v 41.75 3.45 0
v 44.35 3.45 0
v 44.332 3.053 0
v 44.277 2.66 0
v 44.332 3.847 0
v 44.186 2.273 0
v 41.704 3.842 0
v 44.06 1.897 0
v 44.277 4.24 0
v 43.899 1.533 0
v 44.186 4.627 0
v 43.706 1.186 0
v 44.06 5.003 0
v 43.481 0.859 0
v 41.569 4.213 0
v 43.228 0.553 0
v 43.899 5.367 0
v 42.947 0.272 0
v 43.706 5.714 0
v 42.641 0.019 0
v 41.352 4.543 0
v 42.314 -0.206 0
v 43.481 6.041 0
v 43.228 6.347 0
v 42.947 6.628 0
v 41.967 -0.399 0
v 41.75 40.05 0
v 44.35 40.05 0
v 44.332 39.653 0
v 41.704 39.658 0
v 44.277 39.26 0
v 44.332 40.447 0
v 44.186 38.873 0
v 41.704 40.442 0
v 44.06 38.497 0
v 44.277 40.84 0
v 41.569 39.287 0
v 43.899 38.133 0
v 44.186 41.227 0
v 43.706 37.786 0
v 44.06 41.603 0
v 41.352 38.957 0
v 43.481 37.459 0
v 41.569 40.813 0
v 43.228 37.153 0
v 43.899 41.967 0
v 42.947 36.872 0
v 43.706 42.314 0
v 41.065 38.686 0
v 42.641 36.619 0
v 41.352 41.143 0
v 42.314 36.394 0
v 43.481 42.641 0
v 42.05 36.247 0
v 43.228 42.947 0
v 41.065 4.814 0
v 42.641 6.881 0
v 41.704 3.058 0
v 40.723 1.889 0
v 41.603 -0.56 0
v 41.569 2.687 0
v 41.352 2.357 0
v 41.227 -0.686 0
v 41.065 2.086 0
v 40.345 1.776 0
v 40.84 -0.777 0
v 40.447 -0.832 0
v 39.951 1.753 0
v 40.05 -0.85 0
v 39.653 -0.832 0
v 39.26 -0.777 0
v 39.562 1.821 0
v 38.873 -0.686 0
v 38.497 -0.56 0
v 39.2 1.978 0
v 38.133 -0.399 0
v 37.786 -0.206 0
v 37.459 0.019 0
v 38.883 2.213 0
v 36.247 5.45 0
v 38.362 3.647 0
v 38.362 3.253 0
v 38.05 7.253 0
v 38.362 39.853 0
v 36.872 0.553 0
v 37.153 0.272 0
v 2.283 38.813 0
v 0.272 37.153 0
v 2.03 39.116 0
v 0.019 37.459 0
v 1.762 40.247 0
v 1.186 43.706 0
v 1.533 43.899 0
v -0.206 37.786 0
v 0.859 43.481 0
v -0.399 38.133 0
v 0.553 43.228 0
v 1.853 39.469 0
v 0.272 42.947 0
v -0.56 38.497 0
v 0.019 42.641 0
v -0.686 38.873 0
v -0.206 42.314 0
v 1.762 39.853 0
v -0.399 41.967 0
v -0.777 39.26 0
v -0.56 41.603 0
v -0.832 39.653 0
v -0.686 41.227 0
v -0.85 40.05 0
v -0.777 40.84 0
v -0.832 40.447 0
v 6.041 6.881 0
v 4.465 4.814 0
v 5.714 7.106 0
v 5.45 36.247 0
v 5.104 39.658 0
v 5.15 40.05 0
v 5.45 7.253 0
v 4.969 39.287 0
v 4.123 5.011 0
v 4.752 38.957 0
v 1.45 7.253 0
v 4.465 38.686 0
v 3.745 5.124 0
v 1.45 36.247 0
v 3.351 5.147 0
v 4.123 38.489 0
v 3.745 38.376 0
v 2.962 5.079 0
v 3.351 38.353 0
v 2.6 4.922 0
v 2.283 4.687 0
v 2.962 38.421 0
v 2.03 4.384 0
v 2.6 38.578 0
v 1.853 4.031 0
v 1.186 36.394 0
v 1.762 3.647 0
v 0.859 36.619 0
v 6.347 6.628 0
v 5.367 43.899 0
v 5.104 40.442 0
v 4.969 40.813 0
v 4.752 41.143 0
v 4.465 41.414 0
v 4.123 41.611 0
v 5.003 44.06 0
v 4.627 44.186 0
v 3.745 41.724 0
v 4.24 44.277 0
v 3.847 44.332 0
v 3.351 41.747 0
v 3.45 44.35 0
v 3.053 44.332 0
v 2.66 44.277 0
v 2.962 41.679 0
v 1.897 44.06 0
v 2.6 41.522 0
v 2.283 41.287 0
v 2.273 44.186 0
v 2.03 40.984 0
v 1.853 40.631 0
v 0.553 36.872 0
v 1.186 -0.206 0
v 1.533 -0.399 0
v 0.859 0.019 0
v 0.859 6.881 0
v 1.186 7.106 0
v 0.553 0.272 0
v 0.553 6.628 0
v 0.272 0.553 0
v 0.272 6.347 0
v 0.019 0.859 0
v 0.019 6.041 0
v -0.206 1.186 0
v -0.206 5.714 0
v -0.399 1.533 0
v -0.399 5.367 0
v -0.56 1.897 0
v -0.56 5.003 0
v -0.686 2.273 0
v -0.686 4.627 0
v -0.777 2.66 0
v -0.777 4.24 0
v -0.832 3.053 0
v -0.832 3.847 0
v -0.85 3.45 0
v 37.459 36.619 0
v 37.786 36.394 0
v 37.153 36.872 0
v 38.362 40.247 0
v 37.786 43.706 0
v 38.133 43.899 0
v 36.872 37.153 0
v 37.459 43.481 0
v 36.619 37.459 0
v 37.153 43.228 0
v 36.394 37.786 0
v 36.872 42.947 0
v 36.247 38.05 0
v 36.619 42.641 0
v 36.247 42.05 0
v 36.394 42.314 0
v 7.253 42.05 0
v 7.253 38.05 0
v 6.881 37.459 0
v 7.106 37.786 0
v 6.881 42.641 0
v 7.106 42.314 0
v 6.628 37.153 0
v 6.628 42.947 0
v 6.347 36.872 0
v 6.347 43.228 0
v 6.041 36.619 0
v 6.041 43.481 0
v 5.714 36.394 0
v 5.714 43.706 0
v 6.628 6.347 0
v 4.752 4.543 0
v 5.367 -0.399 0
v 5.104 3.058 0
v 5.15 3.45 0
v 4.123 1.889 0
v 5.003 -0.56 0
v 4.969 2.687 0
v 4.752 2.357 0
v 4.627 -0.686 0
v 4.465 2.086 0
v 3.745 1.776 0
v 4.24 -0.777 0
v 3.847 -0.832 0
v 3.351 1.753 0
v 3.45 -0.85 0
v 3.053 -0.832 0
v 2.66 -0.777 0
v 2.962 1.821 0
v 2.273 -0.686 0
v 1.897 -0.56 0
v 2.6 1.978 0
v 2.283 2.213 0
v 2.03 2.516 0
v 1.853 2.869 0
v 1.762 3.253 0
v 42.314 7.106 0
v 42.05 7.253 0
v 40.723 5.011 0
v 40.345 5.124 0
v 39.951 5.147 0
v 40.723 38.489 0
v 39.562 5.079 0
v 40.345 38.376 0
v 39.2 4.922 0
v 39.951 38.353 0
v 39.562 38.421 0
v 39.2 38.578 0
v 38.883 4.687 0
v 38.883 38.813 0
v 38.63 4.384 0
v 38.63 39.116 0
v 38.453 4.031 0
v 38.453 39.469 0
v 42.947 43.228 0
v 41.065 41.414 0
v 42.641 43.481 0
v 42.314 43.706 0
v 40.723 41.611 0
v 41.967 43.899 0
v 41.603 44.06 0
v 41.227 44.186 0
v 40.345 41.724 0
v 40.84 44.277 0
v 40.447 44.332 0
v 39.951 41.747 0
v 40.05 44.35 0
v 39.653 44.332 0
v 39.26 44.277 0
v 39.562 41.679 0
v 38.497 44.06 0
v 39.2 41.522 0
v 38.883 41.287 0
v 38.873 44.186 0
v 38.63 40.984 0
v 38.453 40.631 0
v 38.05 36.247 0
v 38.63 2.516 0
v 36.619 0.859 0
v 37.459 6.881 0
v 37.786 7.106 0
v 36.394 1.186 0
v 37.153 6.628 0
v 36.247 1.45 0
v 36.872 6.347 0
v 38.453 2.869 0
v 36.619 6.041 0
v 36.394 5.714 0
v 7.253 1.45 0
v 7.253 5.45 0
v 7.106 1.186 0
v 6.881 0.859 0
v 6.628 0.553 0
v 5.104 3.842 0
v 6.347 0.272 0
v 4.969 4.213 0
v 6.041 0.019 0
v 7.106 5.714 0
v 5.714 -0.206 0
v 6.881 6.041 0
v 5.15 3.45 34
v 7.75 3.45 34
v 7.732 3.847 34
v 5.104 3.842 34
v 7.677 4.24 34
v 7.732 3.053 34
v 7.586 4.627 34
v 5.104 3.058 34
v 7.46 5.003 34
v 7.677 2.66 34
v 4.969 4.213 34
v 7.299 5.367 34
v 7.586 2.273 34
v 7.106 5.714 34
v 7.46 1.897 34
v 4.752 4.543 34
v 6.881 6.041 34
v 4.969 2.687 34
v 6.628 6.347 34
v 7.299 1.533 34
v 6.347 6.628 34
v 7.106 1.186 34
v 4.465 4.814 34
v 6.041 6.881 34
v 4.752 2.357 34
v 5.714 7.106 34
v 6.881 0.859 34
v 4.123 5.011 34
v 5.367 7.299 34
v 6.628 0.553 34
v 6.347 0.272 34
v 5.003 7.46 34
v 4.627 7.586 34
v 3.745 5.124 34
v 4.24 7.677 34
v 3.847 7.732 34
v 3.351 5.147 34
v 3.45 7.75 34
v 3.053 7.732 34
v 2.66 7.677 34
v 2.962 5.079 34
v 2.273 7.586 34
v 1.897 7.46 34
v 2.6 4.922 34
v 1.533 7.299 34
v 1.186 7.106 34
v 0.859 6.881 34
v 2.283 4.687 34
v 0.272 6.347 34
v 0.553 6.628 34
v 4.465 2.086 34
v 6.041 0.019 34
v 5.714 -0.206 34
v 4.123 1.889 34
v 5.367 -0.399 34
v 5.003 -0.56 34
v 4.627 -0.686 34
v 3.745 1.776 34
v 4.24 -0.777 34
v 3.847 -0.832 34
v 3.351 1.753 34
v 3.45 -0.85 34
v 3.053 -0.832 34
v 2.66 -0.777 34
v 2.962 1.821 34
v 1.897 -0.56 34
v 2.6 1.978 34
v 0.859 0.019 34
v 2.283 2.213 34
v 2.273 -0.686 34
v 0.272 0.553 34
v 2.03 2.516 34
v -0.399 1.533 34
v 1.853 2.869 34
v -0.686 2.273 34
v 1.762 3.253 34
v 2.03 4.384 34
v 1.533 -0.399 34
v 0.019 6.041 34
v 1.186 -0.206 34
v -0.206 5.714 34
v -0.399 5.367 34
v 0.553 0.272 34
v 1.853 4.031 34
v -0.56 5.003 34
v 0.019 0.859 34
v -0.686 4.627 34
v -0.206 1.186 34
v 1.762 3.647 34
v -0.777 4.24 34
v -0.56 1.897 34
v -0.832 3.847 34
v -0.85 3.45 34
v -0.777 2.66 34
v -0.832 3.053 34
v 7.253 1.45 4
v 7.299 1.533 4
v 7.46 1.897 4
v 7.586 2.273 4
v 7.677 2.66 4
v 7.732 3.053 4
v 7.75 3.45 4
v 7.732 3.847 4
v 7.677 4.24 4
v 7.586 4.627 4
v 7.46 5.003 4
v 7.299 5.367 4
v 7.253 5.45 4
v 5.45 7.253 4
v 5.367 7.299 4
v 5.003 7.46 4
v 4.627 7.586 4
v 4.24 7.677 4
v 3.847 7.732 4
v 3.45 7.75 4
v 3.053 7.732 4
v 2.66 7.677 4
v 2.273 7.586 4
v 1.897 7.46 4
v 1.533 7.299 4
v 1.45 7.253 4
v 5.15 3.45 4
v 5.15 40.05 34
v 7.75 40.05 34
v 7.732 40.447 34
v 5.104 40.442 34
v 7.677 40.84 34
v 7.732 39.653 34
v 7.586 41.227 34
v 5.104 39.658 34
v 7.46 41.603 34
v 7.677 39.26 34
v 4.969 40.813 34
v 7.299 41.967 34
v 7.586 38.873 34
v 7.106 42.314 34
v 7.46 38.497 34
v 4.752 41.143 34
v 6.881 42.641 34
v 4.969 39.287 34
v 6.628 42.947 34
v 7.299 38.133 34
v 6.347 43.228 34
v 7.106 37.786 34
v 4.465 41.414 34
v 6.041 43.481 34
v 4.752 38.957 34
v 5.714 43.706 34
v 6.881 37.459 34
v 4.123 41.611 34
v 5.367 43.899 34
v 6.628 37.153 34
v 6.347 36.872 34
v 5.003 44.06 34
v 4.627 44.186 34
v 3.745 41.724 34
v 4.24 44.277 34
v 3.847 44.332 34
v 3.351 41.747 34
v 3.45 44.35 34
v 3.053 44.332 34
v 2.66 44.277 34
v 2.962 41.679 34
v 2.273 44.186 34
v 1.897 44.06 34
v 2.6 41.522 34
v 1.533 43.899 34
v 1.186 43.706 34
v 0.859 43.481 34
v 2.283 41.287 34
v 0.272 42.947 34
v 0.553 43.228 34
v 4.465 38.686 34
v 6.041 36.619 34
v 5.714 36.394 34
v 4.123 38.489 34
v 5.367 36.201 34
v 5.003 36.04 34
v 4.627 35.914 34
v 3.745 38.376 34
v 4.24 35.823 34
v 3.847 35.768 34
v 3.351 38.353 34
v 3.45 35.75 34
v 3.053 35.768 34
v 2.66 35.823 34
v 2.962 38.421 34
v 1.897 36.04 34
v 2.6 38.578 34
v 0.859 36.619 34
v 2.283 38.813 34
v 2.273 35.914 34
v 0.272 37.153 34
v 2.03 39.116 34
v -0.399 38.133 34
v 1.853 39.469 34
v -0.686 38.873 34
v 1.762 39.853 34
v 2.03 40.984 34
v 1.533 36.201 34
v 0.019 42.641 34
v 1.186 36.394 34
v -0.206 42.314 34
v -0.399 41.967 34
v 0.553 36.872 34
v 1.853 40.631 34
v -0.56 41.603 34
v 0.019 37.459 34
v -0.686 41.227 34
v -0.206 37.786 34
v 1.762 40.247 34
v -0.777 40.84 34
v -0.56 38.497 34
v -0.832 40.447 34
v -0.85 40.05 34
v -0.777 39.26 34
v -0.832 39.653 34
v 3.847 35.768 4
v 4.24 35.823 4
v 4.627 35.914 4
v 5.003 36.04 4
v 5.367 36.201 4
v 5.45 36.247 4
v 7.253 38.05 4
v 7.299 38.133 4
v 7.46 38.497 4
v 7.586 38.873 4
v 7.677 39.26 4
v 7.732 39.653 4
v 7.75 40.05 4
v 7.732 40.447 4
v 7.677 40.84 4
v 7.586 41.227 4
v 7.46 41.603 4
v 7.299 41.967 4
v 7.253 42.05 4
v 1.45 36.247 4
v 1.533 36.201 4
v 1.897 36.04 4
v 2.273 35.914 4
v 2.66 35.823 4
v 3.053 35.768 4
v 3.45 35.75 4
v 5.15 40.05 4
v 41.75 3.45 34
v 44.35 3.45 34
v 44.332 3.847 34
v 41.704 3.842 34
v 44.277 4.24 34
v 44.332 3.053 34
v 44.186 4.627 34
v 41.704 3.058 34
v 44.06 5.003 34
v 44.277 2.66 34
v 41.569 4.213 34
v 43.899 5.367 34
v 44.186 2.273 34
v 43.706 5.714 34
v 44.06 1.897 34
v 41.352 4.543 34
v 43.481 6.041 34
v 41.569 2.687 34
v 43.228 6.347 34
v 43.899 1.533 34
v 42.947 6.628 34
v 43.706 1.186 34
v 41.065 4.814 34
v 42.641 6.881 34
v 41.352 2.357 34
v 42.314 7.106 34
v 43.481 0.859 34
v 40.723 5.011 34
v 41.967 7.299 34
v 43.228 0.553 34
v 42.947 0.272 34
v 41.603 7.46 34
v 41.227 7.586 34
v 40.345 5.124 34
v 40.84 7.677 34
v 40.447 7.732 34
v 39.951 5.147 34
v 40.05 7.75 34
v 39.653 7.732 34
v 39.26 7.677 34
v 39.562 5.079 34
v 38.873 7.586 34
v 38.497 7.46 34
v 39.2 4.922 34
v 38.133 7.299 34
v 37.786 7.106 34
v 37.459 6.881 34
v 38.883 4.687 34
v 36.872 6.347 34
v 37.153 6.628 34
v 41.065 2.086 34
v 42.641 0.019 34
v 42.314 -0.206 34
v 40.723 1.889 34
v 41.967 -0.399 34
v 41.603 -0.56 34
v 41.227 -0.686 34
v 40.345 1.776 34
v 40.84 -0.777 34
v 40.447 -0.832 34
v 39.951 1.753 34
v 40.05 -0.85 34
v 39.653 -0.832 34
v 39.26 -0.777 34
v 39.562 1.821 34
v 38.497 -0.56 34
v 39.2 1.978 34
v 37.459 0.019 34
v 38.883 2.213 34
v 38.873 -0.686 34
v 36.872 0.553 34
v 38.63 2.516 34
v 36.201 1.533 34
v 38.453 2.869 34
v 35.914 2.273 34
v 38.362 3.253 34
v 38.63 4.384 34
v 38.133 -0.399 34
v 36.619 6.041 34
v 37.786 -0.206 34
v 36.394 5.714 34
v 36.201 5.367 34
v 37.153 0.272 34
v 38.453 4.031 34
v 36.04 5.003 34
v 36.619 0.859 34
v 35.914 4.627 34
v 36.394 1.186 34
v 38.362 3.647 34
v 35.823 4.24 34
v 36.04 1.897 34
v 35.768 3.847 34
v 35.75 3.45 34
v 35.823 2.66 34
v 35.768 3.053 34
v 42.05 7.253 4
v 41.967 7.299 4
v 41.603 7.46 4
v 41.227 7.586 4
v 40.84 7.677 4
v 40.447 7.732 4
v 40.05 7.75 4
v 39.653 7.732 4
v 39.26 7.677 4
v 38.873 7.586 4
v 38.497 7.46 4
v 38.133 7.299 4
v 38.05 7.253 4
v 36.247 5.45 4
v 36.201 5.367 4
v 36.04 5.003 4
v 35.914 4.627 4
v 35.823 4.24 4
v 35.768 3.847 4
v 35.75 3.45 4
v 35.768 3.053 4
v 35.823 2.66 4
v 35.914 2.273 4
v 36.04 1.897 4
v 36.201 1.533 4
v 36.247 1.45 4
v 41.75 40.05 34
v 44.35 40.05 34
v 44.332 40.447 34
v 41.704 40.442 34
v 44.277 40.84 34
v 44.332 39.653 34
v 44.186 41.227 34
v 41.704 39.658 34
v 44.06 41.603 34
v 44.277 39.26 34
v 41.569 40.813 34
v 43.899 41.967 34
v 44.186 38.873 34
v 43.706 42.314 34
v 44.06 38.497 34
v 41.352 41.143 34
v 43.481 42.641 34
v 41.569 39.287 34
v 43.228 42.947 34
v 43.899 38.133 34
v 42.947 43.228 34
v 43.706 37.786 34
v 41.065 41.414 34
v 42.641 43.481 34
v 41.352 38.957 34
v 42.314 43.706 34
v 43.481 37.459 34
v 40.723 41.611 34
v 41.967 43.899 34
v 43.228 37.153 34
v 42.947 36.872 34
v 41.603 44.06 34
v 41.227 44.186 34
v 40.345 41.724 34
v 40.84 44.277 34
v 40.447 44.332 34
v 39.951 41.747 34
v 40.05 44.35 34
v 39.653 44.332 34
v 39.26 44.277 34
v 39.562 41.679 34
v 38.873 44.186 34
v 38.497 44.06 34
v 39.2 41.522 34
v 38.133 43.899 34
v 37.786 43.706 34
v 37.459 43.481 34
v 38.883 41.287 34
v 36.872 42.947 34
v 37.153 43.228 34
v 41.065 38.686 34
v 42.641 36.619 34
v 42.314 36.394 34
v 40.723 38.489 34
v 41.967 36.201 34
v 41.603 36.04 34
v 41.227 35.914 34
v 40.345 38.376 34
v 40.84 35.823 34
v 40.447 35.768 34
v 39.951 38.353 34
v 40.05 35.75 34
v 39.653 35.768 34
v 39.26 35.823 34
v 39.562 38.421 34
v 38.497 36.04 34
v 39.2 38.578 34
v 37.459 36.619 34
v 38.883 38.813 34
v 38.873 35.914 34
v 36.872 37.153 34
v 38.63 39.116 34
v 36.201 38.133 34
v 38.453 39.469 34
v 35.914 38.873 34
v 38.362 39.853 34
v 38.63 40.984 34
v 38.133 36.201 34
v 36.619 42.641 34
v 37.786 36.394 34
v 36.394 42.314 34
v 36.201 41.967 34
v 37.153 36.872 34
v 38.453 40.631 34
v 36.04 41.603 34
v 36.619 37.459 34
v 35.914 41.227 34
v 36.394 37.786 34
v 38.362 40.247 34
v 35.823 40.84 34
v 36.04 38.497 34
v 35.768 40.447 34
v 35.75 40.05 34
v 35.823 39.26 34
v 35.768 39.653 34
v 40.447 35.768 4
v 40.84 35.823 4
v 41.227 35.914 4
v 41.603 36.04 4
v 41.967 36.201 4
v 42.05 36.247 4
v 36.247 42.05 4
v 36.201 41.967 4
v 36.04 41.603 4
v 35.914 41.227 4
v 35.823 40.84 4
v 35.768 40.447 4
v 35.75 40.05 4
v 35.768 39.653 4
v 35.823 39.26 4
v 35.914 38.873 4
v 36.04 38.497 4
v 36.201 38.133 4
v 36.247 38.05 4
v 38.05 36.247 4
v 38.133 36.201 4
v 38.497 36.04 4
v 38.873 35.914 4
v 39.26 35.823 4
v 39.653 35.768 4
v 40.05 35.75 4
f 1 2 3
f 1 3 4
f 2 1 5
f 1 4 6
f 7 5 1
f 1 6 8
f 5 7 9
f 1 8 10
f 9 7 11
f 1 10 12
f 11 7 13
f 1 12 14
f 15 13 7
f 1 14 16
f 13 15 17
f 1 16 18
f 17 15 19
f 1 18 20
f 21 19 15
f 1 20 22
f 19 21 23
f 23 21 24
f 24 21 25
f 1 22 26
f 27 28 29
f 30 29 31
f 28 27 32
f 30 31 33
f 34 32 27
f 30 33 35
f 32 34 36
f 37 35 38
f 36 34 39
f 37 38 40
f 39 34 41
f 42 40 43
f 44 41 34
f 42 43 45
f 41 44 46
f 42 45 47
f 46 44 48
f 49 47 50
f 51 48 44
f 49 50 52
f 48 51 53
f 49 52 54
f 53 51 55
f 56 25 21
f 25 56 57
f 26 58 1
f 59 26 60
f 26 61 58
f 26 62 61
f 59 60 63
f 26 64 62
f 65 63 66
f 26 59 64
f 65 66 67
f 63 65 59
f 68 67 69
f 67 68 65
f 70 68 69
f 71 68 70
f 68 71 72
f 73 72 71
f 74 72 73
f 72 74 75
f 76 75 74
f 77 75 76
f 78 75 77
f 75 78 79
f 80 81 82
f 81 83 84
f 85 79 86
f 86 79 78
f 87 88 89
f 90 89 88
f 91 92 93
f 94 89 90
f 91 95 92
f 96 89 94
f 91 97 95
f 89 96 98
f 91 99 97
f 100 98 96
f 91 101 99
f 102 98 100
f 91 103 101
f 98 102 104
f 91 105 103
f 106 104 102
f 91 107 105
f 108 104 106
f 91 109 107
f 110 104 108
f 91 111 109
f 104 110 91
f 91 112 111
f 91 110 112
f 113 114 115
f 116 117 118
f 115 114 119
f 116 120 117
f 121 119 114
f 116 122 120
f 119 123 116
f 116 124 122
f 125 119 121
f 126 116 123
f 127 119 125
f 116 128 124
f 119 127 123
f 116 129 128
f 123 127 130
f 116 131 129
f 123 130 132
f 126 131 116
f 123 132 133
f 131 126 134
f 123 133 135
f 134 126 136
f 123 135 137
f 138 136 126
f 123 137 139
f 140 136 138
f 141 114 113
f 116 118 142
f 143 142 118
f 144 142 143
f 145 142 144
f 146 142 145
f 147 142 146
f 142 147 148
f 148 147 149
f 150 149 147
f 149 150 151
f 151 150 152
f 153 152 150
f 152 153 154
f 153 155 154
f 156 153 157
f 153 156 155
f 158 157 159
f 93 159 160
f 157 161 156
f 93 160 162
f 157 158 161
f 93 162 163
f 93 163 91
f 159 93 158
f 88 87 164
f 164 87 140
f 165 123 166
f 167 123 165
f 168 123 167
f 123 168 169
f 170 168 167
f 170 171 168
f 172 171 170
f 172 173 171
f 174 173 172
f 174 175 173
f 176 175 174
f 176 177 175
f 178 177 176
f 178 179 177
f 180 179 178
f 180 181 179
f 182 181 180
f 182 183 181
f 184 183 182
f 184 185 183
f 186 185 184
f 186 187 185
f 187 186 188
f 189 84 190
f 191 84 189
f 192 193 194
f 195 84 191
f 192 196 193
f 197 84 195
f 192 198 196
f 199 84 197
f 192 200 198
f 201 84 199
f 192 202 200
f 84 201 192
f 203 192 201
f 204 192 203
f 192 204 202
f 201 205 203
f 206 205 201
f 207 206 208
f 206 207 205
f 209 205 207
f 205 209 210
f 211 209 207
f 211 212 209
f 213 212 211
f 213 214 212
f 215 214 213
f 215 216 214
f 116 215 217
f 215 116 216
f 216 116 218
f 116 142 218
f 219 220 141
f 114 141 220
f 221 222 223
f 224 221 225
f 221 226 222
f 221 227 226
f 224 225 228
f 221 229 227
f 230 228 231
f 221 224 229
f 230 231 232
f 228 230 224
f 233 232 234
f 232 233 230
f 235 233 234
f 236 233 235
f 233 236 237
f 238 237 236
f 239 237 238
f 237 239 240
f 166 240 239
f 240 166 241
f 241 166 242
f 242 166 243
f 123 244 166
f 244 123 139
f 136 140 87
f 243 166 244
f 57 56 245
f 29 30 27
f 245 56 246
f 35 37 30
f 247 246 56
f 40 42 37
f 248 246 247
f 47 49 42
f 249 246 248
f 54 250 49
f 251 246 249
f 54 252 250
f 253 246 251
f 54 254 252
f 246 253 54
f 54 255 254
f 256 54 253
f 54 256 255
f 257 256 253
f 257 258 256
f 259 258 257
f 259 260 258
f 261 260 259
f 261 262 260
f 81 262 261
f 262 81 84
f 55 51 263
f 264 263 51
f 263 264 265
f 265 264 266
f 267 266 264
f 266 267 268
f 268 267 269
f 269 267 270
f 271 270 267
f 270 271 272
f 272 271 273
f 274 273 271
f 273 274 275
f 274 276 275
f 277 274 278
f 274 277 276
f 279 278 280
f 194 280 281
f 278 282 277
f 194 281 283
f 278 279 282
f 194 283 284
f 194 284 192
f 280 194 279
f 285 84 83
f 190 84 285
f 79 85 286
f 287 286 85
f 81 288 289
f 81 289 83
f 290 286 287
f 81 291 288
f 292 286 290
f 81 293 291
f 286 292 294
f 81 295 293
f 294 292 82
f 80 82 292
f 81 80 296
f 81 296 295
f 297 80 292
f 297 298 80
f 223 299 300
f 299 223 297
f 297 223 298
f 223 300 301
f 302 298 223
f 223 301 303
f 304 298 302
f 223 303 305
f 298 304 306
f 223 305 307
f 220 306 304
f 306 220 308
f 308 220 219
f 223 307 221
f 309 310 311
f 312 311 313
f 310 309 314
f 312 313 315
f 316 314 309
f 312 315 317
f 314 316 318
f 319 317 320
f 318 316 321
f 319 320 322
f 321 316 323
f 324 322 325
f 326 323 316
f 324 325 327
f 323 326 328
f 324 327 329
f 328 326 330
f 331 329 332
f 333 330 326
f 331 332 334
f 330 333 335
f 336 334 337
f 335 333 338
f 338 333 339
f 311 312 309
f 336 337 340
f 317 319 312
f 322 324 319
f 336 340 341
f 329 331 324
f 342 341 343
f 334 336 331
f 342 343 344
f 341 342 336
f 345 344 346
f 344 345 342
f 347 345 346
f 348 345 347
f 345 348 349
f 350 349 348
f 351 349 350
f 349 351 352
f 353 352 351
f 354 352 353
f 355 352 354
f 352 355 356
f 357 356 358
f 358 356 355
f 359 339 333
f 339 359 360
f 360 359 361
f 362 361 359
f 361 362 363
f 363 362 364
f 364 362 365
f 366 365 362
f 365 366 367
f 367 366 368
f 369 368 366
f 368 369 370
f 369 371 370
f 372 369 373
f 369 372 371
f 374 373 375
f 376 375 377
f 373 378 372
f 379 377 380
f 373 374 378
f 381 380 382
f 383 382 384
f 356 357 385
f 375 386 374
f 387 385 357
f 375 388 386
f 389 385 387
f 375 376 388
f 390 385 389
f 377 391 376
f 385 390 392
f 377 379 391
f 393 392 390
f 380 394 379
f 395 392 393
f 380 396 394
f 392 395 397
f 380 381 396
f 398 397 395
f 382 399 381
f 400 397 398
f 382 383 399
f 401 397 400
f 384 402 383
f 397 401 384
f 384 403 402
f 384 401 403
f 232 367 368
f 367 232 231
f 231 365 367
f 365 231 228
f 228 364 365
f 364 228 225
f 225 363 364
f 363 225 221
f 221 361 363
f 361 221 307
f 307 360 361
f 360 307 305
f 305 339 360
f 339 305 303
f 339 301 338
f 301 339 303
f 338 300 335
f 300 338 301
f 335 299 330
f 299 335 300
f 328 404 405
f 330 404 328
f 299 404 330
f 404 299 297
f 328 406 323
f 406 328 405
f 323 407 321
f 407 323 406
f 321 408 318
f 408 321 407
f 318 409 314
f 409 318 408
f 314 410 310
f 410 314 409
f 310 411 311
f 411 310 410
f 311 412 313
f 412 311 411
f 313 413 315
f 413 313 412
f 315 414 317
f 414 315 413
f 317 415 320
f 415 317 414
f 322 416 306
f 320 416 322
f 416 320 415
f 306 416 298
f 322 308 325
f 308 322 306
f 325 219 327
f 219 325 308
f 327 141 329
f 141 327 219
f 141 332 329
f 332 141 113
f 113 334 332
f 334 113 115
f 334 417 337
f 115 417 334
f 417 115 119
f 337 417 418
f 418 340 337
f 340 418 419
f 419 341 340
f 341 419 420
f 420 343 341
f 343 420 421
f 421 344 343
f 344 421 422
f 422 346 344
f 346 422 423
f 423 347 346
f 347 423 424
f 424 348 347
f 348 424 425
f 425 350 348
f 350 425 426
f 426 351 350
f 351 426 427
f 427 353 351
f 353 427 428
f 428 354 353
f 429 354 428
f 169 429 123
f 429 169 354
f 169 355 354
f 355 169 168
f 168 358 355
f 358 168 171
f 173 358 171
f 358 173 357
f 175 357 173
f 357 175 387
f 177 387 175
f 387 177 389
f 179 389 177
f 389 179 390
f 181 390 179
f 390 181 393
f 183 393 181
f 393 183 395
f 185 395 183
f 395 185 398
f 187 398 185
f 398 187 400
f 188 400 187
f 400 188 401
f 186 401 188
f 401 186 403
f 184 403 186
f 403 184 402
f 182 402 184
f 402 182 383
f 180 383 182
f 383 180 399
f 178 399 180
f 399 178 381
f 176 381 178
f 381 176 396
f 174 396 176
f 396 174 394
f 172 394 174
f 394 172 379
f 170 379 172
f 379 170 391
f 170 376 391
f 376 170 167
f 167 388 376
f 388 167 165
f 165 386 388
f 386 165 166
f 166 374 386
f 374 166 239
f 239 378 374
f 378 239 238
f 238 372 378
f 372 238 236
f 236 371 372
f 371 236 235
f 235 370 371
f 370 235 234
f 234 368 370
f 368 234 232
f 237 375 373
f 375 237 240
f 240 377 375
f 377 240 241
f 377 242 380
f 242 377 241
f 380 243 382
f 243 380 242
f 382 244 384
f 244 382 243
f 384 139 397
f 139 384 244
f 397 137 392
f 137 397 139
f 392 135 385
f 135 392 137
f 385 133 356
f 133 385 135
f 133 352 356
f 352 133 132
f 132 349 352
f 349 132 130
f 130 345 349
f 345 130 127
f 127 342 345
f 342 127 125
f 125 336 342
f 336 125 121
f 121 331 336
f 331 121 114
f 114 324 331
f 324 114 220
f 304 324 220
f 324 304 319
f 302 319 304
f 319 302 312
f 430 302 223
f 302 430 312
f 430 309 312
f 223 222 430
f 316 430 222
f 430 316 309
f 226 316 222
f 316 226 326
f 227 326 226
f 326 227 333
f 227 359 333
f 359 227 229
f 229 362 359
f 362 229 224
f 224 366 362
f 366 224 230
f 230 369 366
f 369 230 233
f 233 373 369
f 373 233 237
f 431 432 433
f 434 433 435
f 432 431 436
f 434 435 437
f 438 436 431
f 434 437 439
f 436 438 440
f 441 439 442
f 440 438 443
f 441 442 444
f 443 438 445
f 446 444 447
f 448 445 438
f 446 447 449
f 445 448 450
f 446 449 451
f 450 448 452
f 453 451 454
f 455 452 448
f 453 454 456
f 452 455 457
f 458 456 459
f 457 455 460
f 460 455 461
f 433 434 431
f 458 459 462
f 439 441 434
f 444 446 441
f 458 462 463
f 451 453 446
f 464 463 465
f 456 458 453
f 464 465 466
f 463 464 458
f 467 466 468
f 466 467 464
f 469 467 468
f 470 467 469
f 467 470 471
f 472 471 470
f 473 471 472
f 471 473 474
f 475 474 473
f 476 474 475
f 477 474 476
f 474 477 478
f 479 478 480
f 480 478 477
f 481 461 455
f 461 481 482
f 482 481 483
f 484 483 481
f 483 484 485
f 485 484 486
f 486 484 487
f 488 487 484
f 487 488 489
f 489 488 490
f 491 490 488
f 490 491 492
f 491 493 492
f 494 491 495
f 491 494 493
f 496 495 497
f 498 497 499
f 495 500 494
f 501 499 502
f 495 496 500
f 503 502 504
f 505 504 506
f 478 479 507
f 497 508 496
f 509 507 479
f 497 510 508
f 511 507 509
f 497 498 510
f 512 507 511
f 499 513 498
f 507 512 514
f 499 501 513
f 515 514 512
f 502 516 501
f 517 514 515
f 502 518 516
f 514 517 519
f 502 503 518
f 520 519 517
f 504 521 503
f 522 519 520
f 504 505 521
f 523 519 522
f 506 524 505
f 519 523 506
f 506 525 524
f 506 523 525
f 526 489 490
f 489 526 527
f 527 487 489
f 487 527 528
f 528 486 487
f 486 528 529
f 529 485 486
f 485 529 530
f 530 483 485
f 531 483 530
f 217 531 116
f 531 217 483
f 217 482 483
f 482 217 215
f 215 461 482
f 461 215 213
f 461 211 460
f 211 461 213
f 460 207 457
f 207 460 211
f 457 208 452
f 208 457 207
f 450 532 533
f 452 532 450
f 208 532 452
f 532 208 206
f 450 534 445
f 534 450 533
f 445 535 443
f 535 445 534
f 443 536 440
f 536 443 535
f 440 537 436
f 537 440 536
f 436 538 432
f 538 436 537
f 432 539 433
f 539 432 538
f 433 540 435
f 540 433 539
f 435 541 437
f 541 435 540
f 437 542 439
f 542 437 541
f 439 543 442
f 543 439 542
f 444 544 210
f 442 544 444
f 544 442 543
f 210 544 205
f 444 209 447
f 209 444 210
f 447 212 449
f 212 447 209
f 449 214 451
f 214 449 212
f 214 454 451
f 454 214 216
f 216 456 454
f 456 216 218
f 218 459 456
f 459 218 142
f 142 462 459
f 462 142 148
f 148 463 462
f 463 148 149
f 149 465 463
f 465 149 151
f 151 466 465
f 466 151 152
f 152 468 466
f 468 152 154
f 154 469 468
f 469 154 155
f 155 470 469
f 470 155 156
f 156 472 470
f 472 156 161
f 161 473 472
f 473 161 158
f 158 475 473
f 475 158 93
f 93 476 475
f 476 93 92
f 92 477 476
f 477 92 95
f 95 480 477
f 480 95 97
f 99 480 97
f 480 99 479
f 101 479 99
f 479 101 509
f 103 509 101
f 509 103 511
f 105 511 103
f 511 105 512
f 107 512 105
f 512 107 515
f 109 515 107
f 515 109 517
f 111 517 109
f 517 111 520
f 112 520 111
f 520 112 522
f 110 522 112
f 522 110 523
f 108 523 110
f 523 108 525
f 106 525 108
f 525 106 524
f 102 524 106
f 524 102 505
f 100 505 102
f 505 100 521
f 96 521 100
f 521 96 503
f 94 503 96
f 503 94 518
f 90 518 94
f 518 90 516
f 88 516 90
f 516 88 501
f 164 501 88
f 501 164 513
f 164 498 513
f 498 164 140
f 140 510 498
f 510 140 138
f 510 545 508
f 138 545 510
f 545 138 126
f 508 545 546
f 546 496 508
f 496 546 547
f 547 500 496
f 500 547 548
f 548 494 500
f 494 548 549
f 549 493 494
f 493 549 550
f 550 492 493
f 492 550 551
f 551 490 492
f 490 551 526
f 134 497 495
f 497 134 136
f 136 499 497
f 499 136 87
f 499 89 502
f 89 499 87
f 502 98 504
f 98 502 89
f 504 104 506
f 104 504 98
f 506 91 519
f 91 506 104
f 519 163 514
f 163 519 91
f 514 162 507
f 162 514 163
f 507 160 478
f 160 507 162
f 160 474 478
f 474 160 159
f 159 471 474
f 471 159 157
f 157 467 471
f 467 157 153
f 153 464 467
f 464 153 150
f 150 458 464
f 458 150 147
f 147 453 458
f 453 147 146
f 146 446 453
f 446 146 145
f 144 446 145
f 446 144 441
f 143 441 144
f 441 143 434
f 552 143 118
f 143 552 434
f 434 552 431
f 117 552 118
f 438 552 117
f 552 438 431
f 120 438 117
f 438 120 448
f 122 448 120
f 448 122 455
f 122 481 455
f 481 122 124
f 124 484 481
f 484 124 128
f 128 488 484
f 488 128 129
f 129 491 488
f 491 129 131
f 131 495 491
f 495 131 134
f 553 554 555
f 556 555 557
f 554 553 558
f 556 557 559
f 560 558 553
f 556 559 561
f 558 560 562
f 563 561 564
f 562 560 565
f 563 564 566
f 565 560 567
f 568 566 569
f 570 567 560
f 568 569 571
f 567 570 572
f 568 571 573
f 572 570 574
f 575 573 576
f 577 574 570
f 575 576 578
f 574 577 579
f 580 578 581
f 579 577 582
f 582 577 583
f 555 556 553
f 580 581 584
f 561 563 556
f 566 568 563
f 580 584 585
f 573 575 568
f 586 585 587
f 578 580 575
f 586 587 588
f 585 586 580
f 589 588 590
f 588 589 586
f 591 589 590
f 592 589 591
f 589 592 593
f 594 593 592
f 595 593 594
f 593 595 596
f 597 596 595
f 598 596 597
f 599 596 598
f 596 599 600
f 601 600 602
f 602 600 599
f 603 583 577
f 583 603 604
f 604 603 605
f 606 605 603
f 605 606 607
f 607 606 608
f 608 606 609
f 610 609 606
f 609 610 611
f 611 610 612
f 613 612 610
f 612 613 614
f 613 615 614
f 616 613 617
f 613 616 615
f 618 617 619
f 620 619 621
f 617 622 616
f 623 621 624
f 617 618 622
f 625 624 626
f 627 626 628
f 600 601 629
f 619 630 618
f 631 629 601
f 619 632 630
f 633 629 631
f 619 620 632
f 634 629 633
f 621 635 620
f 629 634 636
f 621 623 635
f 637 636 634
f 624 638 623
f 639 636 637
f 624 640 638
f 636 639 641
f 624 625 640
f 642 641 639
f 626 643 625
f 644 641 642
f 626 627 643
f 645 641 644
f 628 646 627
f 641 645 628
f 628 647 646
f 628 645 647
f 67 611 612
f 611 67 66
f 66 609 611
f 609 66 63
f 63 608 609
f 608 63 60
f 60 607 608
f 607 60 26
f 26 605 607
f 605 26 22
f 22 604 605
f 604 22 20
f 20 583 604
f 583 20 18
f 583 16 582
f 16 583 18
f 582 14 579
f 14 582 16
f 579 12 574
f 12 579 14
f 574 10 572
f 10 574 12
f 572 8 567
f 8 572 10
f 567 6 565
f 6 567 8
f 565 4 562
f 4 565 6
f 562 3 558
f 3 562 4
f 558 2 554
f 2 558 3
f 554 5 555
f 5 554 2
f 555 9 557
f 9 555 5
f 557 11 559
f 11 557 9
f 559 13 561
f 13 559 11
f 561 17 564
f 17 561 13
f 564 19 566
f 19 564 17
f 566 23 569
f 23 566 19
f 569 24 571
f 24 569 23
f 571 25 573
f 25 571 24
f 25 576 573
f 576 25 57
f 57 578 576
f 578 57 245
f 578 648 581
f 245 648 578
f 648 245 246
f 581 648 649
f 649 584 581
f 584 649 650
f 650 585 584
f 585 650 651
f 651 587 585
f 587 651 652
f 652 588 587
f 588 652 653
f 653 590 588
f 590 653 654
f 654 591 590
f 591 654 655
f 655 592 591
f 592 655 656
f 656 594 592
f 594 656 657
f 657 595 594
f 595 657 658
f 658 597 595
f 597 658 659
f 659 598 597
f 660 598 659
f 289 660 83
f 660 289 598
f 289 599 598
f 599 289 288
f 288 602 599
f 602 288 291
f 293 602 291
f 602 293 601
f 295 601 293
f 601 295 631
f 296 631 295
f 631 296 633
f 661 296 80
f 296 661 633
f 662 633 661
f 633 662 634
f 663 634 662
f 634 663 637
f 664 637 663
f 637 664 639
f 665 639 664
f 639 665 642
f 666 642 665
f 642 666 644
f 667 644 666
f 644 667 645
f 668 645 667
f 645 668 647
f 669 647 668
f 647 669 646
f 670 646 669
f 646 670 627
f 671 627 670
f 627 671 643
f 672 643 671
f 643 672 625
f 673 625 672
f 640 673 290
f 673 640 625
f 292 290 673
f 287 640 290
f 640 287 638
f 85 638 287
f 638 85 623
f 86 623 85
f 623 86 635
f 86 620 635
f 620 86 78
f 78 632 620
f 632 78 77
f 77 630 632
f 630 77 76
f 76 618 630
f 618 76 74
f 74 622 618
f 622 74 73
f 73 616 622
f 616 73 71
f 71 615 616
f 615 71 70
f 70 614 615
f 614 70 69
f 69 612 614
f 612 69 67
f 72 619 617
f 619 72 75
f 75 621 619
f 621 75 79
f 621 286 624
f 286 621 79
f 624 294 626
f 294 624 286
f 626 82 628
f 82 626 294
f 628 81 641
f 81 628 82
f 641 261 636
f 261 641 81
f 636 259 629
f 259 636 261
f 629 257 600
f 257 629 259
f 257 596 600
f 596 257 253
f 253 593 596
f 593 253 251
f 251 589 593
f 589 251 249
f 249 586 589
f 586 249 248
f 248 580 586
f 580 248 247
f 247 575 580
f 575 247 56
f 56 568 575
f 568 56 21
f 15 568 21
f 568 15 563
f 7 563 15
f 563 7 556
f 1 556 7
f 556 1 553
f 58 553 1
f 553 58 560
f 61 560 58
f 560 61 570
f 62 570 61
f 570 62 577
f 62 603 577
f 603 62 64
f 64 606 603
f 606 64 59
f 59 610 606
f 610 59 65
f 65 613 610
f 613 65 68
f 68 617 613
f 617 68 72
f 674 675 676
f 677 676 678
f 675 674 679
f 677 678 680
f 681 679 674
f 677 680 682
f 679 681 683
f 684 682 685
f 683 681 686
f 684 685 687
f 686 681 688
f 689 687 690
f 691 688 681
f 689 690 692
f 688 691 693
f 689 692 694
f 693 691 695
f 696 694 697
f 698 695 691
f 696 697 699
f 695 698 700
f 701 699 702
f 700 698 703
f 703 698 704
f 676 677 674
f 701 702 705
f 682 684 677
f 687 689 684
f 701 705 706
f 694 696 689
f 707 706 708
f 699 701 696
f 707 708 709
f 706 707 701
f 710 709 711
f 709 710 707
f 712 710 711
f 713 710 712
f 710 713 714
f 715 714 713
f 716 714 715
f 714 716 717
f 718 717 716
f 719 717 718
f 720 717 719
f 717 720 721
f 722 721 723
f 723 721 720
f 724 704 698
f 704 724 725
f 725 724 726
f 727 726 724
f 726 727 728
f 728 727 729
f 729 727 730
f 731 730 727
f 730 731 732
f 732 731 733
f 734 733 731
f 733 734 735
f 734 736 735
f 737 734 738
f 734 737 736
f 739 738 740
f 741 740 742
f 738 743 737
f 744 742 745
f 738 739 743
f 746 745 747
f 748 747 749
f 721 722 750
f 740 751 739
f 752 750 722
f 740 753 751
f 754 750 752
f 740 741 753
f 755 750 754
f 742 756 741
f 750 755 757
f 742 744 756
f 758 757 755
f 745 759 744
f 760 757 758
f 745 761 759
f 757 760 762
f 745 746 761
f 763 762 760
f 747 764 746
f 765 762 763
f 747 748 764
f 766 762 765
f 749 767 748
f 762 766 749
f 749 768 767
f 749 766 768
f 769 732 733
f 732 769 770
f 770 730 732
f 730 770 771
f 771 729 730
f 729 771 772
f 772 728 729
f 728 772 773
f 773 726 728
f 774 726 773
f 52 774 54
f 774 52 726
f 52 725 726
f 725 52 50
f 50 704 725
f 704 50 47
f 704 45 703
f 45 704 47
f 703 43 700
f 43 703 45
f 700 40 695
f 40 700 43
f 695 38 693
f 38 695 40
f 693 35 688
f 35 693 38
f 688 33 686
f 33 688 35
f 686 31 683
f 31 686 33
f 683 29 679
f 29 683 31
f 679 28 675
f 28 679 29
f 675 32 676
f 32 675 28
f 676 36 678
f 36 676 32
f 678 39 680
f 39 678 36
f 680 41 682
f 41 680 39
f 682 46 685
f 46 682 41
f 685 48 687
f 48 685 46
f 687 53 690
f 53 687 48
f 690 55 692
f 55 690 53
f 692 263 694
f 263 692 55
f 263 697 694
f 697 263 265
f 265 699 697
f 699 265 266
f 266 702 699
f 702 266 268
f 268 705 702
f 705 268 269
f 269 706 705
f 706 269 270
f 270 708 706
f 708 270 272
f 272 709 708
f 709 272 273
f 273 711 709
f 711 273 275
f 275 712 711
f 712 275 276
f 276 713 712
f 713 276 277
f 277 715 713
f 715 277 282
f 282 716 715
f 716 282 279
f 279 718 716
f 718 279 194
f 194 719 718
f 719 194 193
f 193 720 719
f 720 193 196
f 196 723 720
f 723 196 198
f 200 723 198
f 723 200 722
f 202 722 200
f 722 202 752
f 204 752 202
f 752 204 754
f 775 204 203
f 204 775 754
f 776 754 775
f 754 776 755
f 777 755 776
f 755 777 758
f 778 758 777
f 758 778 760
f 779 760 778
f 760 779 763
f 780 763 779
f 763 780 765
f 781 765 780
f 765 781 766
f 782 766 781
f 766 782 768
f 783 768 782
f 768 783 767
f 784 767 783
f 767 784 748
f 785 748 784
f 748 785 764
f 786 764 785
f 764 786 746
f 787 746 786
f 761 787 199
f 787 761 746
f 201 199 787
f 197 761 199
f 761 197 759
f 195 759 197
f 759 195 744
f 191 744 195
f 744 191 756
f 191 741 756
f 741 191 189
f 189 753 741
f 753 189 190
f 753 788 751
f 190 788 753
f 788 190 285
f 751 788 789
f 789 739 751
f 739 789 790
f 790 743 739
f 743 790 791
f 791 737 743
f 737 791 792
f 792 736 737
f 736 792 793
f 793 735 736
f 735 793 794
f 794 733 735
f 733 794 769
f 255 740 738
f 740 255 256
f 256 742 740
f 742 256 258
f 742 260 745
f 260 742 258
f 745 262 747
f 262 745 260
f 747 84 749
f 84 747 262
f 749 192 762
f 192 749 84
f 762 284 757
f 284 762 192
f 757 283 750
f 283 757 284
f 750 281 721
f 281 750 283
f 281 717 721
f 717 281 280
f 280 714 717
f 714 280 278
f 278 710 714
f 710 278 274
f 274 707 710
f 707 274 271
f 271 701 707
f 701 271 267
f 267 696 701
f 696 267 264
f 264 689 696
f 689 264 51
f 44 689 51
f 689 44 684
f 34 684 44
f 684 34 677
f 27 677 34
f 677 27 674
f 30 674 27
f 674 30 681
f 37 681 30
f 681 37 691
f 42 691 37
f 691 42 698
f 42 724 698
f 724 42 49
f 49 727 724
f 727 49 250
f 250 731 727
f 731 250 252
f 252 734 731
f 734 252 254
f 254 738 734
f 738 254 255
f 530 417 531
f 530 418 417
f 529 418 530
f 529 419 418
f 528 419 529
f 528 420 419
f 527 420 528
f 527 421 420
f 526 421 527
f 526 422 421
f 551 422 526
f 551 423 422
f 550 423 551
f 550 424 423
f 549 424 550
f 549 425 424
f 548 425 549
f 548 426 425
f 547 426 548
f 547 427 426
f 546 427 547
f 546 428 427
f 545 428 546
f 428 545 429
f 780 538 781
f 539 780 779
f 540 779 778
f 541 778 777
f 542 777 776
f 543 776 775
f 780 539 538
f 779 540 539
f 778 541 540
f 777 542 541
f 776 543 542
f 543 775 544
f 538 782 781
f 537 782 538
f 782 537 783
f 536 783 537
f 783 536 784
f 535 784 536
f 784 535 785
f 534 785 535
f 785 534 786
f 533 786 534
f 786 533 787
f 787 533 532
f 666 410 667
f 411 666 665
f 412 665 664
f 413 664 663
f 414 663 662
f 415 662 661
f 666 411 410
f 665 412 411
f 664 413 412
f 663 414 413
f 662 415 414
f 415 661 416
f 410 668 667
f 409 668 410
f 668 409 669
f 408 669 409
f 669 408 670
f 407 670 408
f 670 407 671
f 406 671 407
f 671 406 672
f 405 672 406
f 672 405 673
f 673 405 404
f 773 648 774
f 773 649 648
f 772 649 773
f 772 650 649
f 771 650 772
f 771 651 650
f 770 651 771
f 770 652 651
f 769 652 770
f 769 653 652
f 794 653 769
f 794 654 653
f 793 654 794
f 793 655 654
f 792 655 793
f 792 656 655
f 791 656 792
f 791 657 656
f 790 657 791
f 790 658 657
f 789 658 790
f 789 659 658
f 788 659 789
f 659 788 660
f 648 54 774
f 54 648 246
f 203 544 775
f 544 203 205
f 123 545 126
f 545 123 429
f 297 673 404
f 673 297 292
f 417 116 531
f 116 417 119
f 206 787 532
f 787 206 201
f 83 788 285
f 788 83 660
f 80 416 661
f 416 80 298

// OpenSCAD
$fa = 1;
$fs = 0.4;

tolerance = 0.4;
mount_thickness = 4;
wall_thickness = 2.6;
mount_height = 30;

side_length = 43.5;
hole_diam = 3 + tolerance;
holes_distance = 40 - hole_diam;
hole_side_distance = (side_length - holes_distance) / 2;

module circles_bridge(diam, distance, thickness, direction = 1) {
    angle = 90 * direction;
    rotate(a = angle) {
        translate([0, diam / 2, 0])
            polygon([
                    [thickness / 2, 0],
                    [-thickness / 2, 0],
                    [-thickness / 2, distance - diam],
                    [thickness / 2, distance - diam],
            ]);
    };
}

module holes_pattern() {
    translate([hole_side_distance, hole_side_distance, 0])
        for (nx = [0: 1: 1]) {
            for (ny = [0: 1: 1]) {
                translate([holes_distance * nx, holes_distance * ny, 0])
                    children();
            }
        }

}

module standoff_profile() {
    difference() {
        circle(d = hole_diam + wall_thickness * 2);
        circle(d = hole_diam);
    }
}

module standoff() {
    linear_extrude(height = mount_height + mount_thickness)
        standoff_profile();
}

module standoffs() {
    holes_pattern() {
        standoff();
    };
}

module standoff_bridges_profile() {
    translate([hole_side_distance, hole_side_distance, 0]){
        for (i = [0:1:1]) {
            translate([holes_distance * i, holes_distance * i, 0]) {
                for (j = [-1:1:0]) {
                    circles_bridge(hole_diam, holes_distance, 4, j + 2 * i);
                }
            };
        }
    }
}

module standoff_bridges() {
    linear_extrude(height = mount_thickness)
        standoff_bridges_profile();
}

standoffs();
standoff_bridges();
